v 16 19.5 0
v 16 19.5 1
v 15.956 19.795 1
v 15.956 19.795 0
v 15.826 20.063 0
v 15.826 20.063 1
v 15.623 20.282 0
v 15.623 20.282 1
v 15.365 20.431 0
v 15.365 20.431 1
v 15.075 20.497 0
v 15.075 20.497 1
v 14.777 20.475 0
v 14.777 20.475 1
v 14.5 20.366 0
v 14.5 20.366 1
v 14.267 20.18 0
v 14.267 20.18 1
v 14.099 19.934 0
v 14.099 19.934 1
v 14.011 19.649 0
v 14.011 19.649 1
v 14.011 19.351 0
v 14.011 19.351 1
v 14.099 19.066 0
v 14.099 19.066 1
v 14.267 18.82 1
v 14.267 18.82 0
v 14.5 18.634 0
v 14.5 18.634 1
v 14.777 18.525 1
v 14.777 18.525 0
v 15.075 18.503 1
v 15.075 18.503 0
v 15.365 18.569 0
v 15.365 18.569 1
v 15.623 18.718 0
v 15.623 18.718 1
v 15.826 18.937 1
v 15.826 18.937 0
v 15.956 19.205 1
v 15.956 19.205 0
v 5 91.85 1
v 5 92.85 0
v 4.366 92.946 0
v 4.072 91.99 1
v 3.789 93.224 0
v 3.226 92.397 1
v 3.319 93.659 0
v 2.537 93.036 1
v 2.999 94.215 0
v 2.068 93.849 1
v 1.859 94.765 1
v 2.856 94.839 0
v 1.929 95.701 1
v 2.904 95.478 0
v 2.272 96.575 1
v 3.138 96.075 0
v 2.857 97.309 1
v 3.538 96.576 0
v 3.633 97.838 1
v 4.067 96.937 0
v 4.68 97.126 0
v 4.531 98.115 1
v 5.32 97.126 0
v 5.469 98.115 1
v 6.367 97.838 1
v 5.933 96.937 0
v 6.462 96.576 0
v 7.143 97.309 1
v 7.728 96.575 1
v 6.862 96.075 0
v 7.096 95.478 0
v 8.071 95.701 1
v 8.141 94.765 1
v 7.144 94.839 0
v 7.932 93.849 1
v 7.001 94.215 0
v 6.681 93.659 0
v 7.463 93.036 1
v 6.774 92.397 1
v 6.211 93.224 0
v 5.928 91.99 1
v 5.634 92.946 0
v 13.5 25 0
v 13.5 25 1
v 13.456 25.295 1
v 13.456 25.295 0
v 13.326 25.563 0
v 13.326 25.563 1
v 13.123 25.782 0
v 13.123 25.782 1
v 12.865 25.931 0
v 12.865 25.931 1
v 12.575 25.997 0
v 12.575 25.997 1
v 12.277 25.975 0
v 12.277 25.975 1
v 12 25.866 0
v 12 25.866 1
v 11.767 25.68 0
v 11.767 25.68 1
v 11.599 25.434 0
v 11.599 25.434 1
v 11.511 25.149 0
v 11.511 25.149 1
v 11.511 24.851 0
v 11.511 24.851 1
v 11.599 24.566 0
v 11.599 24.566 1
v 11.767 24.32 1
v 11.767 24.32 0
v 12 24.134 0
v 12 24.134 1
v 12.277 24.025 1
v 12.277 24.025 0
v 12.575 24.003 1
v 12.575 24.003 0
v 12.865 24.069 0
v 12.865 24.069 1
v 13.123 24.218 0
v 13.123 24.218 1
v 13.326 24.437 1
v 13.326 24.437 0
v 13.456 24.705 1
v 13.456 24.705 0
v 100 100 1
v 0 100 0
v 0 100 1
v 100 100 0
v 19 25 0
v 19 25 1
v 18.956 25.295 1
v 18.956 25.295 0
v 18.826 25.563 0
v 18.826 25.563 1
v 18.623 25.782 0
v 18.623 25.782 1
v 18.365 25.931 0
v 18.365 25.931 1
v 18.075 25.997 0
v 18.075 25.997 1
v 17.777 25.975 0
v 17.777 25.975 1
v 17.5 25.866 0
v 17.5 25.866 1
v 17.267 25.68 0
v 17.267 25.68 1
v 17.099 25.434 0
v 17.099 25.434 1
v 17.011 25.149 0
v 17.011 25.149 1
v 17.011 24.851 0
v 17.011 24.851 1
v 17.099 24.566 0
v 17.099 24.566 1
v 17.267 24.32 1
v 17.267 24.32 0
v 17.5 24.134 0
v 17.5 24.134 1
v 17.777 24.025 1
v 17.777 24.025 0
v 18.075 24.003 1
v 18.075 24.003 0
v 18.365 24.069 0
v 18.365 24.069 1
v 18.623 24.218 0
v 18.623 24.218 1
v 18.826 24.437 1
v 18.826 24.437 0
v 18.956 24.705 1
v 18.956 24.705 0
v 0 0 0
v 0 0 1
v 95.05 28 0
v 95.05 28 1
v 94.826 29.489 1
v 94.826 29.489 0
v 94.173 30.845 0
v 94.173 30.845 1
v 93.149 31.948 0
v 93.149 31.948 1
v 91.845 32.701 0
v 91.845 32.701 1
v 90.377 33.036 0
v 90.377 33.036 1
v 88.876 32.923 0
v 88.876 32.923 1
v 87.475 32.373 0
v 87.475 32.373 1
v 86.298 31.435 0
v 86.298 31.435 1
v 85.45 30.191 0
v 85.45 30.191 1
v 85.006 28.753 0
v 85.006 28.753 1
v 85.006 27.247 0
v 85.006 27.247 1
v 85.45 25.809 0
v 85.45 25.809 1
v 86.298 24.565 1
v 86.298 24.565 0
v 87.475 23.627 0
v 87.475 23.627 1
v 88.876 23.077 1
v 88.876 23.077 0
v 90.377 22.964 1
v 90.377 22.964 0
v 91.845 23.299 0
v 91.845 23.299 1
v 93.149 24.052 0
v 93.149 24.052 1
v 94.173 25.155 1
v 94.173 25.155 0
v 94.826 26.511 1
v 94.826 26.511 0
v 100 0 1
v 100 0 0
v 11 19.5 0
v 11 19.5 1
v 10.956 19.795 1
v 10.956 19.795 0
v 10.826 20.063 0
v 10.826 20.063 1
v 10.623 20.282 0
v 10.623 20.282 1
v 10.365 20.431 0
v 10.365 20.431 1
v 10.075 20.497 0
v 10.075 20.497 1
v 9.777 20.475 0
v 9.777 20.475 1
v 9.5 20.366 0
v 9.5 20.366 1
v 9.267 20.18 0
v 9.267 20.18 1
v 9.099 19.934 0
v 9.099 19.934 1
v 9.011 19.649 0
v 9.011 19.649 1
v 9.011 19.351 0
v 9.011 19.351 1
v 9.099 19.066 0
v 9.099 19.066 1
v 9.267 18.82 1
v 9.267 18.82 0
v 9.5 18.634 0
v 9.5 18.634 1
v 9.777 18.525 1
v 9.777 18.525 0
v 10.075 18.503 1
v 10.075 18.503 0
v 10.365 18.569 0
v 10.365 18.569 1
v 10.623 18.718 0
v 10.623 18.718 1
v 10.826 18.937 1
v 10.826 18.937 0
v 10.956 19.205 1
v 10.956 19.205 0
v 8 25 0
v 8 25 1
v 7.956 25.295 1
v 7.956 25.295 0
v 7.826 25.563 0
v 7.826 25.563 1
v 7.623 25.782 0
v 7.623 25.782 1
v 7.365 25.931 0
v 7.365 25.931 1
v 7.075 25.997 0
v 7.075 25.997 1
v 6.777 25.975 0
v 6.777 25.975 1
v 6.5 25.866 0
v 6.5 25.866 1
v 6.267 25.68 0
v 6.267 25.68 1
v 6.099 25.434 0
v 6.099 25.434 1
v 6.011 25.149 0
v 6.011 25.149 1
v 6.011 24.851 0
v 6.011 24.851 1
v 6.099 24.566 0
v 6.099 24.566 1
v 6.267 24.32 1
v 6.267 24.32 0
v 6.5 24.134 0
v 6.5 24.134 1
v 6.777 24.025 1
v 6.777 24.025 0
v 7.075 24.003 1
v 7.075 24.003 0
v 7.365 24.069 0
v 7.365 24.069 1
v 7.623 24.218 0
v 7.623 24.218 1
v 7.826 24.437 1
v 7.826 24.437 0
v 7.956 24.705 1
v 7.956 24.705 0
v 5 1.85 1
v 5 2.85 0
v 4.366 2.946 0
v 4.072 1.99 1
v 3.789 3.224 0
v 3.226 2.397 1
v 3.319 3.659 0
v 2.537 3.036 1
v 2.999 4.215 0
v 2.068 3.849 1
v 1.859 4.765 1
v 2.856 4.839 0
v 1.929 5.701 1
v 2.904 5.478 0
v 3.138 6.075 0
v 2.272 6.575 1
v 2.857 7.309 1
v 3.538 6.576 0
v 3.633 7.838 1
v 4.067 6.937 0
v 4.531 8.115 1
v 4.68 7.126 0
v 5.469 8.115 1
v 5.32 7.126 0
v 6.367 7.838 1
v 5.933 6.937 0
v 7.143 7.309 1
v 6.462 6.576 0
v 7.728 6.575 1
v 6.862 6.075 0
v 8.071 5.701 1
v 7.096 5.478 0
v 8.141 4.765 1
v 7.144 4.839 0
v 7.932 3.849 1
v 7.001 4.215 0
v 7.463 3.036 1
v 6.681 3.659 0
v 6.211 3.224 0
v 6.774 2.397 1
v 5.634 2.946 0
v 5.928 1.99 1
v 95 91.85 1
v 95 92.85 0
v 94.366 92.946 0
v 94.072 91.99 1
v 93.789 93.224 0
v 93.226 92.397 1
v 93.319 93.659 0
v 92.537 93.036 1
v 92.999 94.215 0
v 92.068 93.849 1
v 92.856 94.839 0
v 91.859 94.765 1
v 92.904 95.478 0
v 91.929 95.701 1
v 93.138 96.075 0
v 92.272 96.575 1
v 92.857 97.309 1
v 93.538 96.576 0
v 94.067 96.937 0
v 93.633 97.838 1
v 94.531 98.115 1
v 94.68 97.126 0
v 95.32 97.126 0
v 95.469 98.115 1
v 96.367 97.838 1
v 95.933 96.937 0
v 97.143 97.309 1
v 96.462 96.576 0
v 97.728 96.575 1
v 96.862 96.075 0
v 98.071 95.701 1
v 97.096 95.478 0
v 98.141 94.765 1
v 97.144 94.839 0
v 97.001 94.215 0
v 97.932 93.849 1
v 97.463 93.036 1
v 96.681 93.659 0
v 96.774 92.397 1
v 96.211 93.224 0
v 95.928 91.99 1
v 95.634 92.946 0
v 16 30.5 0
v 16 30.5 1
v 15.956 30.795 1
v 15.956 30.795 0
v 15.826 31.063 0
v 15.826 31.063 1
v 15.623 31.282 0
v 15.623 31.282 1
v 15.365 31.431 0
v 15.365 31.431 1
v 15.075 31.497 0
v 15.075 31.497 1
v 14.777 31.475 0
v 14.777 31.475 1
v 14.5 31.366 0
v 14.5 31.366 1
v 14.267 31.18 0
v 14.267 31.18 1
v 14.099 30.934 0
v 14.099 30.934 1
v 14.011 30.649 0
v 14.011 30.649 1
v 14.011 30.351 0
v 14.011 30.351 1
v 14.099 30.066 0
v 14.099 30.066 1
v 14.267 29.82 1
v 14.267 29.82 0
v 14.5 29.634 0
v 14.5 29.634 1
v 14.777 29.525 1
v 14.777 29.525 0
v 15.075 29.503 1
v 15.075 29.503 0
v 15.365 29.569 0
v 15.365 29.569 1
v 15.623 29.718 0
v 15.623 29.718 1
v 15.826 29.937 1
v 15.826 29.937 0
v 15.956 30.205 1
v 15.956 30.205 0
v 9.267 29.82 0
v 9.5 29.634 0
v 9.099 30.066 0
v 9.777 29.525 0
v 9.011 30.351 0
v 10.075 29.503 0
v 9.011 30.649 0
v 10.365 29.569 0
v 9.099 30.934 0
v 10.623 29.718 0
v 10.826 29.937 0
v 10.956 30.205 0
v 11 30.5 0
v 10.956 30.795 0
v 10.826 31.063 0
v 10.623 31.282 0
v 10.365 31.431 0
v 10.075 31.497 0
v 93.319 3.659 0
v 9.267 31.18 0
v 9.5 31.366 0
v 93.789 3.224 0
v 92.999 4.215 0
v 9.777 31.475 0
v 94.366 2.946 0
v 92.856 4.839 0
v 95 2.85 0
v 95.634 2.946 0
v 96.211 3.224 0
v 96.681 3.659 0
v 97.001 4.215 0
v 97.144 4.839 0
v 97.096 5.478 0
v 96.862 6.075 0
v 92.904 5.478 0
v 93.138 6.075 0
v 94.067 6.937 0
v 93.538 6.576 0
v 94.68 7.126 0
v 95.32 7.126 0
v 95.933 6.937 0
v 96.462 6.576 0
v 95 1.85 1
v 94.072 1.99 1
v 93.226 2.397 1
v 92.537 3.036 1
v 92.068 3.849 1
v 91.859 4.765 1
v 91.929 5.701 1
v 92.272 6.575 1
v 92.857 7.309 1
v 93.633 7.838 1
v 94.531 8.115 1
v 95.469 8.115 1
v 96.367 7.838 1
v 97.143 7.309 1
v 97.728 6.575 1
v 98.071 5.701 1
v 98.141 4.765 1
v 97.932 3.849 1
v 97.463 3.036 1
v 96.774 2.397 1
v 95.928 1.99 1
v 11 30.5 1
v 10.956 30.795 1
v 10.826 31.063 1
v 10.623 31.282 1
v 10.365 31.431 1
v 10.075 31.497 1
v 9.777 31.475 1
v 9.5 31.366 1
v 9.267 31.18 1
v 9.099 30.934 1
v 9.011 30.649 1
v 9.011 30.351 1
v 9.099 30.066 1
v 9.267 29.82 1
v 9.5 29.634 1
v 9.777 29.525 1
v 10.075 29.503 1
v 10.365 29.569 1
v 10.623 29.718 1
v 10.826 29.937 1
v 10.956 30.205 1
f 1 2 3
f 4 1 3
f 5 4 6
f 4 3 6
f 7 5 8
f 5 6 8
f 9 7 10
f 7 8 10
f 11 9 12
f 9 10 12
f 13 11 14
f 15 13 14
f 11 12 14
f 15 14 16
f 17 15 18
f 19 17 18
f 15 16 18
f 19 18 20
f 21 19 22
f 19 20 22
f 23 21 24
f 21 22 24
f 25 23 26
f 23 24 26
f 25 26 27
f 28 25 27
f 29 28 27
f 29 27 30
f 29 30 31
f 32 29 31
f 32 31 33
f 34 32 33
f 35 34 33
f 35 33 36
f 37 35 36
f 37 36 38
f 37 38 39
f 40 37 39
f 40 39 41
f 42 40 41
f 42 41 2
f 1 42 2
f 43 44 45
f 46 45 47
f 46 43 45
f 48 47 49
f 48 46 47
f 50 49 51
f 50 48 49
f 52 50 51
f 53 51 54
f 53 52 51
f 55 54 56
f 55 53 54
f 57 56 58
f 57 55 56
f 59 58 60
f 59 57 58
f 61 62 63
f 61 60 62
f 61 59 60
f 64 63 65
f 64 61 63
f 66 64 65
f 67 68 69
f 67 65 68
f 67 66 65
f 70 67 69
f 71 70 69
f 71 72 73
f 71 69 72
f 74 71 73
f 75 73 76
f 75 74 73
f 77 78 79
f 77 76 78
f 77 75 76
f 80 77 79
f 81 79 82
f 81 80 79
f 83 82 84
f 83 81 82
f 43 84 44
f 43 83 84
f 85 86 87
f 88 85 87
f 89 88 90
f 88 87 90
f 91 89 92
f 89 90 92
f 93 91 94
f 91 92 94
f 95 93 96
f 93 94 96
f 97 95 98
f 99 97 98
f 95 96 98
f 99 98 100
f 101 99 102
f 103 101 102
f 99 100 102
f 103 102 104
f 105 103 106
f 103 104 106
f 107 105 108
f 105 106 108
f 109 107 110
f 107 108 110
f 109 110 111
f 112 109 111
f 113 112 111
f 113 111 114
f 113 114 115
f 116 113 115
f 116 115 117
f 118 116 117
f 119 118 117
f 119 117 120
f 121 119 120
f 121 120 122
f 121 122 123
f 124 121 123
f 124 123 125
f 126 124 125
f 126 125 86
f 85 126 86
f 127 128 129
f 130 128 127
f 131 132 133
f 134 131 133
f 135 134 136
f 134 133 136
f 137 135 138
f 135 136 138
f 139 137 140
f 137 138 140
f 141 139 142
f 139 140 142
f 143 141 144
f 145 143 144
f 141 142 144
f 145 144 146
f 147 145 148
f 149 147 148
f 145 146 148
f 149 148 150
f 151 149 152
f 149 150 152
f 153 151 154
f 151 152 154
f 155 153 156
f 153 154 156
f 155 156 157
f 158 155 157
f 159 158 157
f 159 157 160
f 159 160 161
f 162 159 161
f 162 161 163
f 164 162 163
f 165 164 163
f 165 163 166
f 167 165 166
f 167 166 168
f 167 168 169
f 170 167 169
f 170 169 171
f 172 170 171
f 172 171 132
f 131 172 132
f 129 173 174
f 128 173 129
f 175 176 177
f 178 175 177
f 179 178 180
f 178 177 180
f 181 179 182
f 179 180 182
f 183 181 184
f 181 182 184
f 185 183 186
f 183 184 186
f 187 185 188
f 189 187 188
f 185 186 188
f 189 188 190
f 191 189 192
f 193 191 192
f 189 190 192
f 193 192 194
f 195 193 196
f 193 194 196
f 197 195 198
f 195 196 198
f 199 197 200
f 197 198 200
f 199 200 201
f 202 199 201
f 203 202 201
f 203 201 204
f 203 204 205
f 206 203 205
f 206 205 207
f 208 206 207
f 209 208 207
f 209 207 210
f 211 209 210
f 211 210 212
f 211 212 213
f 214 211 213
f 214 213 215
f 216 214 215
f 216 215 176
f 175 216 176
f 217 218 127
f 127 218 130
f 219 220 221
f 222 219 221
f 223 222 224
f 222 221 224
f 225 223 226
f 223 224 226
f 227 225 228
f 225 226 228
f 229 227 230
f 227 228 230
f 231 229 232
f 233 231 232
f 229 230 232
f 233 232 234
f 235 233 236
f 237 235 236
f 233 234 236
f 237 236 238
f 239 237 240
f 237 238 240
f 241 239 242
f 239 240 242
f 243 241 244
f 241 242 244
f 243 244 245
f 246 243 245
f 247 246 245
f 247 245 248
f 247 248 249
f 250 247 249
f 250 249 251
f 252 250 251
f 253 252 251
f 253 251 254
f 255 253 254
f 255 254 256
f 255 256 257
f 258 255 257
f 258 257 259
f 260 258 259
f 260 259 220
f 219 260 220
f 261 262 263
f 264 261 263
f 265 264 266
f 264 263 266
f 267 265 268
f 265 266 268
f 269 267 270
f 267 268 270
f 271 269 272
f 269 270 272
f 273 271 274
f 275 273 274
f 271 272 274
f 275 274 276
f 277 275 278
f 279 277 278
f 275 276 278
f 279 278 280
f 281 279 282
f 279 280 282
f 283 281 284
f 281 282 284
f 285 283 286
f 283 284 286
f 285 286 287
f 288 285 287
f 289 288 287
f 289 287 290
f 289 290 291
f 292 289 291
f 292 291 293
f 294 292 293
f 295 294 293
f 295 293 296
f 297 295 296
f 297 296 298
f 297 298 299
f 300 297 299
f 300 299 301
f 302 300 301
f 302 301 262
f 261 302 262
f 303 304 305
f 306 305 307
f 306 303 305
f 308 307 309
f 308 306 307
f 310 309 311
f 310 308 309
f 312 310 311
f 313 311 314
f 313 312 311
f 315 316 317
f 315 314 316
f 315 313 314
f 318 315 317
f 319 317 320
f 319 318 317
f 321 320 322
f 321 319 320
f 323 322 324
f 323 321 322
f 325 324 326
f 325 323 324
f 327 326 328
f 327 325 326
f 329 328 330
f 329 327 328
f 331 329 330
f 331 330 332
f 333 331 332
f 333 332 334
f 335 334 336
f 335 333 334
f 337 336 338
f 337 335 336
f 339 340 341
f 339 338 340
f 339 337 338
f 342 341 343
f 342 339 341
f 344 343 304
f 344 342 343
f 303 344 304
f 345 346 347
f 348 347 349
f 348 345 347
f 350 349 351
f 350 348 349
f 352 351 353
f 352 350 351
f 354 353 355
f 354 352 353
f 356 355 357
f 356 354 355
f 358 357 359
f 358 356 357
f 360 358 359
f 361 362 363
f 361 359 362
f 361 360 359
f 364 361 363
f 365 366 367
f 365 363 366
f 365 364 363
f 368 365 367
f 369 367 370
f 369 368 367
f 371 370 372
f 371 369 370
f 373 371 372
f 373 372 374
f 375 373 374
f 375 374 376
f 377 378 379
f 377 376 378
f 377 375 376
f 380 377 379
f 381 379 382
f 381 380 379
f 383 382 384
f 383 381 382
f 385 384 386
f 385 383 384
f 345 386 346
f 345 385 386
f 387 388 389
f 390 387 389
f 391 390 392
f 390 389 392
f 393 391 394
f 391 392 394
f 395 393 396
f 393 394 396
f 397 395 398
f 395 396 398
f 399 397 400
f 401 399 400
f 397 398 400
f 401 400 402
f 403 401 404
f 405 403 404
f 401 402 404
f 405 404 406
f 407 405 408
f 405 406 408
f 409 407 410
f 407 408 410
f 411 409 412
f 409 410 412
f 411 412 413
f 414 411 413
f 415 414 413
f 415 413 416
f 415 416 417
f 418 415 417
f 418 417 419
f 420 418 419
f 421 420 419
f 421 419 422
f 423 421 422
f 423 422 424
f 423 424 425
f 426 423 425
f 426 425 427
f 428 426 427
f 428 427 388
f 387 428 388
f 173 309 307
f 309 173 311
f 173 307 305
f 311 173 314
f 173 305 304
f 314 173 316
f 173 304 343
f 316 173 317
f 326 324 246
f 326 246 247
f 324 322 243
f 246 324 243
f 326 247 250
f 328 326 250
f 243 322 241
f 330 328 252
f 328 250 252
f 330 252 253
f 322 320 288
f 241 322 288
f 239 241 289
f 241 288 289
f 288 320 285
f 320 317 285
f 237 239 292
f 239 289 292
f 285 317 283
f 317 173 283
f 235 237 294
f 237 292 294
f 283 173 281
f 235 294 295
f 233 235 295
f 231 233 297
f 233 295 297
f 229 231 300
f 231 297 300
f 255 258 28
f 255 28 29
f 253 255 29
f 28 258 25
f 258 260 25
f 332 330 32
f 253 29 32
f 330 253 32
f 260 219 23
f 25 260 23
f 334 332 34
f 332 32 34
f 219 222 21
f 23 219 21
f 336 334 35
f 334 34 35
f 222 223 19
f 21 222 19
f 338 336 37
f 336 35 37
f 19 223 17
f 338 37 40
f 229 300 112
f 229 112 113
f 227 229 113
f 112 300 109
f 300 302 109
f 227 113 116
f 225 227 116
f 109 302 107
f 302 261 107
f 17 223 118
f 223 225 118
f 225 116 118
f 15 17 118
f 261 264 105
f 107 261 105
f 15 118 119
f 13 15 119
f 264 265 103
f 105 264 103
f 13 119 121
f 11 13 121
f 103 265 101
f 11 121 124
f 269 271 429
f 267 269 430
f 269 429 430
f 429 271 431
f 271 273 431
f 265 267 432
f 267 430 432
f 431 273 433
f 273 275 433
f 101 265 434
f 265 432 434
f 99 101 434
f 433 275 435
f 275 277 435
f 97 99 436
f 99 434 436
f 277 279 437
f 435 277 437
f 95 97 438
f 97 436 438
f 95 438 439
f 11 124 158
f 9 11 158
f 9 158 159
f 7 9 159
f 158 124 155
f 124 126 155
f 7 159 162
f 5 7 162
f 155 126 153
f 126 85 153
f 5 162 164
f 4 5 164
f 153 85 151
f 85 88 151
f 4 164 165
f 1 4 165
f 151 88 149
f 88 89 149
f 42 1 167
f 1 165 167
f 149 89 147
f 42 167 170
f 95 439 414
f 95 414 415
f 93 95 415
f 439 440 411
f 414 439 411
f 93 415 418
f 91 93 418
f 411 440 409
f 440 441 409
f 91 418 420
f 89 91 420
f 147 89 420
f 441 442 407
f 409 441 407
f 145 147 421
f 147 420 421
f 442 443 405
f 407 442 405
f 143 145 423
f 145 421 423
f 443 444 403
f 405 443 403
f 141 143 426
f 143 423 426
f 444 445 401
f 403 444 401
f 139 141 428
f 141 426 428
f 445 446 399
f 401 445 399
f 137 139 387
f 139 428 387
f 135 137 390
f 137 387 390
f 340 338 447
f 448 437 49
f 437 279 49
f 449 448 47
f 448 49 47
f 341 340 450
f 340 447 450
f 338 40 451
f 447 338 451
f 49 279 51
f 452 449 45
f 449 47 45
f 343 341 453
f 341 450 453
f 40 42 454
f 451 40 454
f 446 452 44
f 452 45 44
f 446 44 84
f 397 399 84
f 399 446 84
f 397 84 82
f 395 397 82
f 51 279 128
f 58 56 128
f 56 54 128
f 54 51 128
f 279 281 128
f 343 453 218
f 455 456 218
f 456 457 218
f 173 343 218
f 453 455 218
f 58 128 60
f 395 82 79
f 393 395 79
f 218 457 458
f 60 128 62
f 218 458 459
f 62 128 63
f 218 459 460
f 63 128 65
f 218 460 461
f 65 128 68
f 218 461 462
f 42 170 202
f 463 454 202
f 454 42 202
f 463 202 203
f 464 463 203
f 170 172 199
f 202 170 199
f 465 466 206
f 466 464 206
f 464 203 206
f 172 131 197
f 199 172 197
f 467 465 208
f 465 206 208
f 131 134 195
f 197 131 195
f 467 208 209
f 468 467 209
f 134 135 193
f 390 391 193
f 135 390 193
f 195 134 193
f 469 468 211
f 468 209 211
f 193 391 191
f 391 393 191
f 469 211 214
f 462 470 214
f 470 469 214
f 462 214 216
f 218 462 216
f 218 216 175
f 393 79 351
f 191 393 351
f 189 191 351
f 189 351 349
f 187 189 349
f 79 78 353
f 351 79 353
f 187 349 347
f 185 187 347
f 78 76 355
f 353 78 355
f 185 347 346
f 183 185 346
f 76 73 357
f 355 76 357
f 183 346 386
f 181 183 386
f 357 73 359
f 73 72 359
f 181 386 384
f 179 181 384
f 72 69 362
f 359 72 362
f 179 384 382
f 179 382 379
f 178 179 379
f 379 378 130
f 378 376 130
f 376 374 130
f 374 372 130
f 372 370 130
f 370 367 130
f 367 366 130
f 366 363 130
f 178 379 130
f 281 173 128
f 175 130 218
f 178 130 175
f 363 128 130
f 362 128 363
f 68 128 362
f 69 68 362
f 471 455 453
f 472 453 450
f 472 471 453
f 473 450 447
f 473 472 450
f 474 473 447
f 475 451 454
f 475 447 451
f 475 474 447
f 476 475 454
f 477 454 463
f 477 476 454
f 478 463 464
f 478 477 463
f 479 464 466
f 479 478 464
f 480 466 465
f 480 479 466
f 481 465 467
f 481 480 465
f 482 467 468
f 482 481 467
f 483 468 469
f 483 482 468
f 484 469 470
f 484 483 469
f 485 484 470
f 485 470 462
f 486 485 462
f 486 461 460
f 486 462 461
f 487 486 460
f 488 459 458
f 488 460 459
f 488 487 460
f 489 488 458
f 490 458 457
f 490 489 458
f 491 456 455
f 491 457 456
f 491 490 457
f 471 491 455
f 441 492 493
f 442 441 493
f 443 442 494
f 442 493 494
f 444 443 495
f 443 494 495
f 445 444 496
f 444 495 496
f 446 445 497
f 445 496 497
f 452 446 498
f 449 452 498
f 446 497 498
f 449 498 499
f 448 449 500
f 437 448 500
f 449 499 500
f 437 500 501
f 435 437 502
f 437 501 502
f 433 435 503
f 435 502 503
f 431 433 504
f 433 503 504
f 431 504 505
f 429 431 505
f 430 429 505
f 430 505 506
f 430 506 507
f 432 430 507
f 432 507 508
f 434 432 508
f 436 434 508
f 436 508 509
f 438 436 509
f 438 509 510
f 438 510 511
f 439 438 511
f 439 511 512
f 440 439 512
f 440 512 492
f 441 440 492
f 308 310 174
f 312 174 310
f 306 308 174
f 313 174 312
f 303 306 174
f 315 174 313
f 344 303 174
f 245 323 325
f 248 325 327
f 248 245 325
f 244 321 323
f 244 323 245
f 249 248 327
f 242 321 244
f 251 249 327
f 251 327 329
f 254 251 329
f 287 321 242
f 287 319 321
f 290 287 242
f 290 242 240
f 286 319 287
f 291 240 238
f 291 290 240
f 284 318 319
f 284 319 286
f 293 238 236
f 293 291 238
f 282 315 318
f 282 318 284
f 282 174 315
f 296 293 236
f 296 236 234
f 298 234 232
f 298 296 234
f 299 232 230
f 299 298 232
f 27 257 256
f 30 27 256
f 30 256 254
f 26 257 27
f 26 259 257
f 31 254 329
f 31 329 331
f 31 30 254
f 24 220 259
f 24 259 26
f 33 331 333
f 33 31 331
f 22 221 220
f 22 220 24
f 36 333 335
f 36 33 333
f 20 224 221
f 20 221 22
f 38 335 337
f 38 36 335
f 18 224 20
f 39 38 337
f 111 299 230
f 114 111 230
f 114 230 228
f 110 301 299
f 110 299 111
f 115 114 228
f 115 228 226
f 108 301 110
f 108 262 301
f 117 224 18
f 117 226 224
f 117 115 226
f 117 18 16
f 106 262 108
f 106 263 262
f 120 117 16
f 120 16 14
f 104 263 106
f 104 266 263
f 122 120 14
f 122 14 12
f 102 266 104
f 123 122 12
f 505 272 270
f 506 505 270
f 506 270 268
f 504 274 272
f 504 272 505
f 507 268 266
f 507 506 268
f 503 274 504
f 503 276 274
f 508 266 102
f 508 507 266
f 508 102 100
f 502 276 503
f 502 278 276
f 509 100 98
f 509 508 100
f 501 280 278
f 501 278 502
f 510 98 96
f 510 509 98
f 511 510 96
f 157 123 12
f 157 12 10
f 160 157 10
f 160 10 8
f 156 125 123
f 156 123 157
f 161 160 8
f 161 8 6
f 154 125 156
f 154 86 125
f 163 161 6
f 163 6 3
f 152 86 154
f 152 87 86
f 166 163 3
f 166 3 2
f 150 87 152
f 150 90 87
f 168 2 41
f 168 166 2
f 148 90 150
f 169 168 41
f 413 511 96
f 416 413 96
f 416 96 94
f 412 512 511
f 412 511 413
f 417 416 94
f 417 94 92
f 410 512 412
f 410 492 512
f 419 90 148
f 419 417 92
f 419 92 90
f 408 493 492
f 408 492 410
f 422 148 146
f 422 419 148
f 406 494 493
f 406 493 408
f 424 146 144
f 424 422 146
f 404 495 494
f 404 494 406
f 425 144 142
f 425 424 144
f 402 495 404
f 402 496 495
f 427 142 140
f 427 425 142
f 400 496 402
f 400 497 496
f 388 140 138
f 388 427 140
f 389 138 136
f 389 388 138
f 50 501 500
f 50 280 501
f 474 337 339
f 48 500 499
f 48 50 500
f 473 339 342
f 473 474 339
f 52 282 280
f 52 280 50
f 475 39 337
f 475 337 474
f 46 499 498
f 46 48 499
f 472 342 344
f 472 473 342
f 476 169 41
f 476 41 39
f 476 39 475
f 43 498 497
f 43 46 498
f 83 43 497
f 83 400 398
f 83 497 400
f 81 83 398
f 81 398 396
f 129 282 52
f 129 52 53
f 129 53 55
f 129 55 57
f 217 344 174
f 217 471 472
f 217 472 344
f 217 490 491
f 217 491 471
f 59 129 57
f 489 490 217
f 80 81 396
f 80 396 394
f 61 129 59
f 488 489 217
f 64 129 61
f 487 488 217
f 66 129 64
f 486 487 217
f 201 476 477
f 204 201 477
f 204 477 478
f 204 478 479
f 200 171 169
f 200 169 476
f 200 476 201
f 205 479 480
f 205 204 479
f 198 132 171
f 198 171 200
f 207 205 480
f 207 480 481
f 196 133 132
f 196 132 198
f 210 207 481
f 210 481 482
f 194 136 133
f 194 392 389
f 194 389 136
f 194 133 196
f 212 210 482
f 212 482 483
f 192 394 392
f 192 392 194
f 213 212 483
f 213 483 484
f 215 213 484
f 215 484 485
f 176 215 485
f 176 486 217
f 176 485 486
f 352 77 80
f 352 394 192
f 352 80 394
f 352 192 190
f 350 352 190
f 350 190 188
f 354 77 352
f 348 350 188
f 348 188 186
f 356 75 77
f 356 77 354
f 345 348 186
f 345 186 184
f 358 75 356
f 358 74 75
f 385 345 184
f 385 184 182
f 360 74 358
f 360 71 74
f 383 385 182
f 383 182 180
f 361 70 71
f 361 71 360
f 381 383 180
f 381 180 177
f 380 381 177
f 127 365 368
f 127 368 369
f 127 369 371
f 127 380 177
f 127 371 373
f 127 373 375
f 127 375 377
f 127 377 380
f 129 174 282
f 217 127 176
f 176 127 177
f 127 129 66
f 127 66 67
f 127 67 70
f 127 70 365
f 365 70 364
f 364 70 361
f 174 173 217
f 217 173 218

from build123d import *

# Parameters (mm, degrees)
ESQUISSE1_W                                 = 100
ESQUISSE1_H                                 = 100
BOSS_EXTRU_1_DEPTH                          = 1
FRAISAGE_POUR_VIS_T_TE_FRAIS_E_M31_AT_COUNT = 2
FRAISAGE_POUR_VIS_T_TE_FRAIS_E_M31_AT_PITCH = 90
FRAISAGE_POUR_VIS_T_TE_FRAIS_E_M31_2_COUNT  = 2
FRAISAGE_POUR_VIS_T_TE_FRAIS_E_M31_2_PITCH  = 127.279220614
FRAISAGE_POUR_VIS_T_TE_FRAIS_E_M31_3_COUNT  = 2
FRAISAGE_POUR_VIS_T_TE_FRAIS_E_M31_3_PITCH  = 90
ESQUISSE4_R                                 = 5.05
ESQUISSE4_R_2                               = 1
ENL_V_MAT_EXTRU_1_DEPTH                     = 2


with BuildPart() as part:
    # Esquisse1 → Boss.-Extru.1 (new body)
    with BuildSketch(Plane.XY):
        with Locations((50, 50)):
            Rectangle(ESQUISSE1_W, ESQUISSE1_H)
    extrude(amount=BOSS_EXTRU_1_DEPTH)

    # Esquisse3 → Fraisage pour vis à tête fraisée M31 (revolve, cut)
    with BuildSketch(Plane(origin=(5, 95, 1), x_dir=(0, -1, 0), z_dir=(1, 0, 0))):
        Polygon((0, 0), (0, 1), (1.8, 1), (1.8, 1.35), (3.15, 0), align=None)
    fraisage_pour_vis_t_te_frais_e_m31 = revolve(axis=Axis((5, 95, 7.35), (0, 0, -1)), mode=Mode.SUBTRACT)

    # Fraisage pour vis à tête fraisée M31 at: Fraisage pour vis à tête fraisée M31 ×2
    with Locations(*[(i * FRAISAGE_POUR_VIS_T_TE_FRAIS_E_M31_AT_PITCH, 0, 0) for i in range(1, FRAISAGE_POUR_VIS_T_TE_FRAIS_E_M31_AT_COUNT)]):
        add(fraisage_pour_vis_t_te_frais_e_m31, mode=Mode.SUBTRACT)

    # Fraisage pour vis _ t_te frais_e M31 2: Fraisage pour vis à tête fraisée M31 ×2
    with Locations(*[Vector(0.707106781, -0.707106781, 0) * (i * FRAISAGE_POUR_VIS_T_TE_FRAIS_E_M31_2_PITCH) for i in range(1, FRAISAGE_POUR_VIS_T_TE_FRAIS_E_M31_2_COUNT)]):
        add(fraisage_pour_vis_t_te_frais_e_m31, mode=Mode.SUBTRACT)

    # Fraisage pour vis _ t_te frais_e M31 3: Fraisage pour vis à tête fraisée M31 ×2
    with Locations(*[(0, -i * FRAISAGE_POUR_VIS_T_TE_FRAIS_E_M31_3_PITCH, 0) for i in range(1, FRAISAGE_POUR_VIS_T_TE_FRAIS_E_M31_3_COUNT)]):
        add(fraisage_pour_vis_t_te_frais_e_m31, mode=Mode.SUBTRACT)

    # Esquisse4 → Enlèv. mat.-Extru.1 (cut, through all)
    with BuildSketch(Plane.XY.offset(1)):
        with Locations((90, 28)):
            Circle(ESQUISSE4_R)
        with Locations((12.5, 25)):
            Circle(ESQUISSE4_R_2)
        with Locations((10, 19.5)):
            Circle(ESQUISSE4_R_2)
        with Locations((7, 25)):
            Circle(ESQUISSE4_R_2)
        with Locations((18, 25)):
            Circle(ESQUISSE4_R_2)
        with Locations((10, 30.5)):
            Circle(ESQUISSE4_R_2)
        with Locations((15, 30.5)):
            Circle(ESQUISSE4_R_2)
        with Locations((15, 19.5)):
            Circle(ESQUISSE4_R_2)
    extrude(amount=-ENL_V_MAT_EXTRU_1_DEPTH, mode=Mode.SUBTRACT)


solid = part.part
